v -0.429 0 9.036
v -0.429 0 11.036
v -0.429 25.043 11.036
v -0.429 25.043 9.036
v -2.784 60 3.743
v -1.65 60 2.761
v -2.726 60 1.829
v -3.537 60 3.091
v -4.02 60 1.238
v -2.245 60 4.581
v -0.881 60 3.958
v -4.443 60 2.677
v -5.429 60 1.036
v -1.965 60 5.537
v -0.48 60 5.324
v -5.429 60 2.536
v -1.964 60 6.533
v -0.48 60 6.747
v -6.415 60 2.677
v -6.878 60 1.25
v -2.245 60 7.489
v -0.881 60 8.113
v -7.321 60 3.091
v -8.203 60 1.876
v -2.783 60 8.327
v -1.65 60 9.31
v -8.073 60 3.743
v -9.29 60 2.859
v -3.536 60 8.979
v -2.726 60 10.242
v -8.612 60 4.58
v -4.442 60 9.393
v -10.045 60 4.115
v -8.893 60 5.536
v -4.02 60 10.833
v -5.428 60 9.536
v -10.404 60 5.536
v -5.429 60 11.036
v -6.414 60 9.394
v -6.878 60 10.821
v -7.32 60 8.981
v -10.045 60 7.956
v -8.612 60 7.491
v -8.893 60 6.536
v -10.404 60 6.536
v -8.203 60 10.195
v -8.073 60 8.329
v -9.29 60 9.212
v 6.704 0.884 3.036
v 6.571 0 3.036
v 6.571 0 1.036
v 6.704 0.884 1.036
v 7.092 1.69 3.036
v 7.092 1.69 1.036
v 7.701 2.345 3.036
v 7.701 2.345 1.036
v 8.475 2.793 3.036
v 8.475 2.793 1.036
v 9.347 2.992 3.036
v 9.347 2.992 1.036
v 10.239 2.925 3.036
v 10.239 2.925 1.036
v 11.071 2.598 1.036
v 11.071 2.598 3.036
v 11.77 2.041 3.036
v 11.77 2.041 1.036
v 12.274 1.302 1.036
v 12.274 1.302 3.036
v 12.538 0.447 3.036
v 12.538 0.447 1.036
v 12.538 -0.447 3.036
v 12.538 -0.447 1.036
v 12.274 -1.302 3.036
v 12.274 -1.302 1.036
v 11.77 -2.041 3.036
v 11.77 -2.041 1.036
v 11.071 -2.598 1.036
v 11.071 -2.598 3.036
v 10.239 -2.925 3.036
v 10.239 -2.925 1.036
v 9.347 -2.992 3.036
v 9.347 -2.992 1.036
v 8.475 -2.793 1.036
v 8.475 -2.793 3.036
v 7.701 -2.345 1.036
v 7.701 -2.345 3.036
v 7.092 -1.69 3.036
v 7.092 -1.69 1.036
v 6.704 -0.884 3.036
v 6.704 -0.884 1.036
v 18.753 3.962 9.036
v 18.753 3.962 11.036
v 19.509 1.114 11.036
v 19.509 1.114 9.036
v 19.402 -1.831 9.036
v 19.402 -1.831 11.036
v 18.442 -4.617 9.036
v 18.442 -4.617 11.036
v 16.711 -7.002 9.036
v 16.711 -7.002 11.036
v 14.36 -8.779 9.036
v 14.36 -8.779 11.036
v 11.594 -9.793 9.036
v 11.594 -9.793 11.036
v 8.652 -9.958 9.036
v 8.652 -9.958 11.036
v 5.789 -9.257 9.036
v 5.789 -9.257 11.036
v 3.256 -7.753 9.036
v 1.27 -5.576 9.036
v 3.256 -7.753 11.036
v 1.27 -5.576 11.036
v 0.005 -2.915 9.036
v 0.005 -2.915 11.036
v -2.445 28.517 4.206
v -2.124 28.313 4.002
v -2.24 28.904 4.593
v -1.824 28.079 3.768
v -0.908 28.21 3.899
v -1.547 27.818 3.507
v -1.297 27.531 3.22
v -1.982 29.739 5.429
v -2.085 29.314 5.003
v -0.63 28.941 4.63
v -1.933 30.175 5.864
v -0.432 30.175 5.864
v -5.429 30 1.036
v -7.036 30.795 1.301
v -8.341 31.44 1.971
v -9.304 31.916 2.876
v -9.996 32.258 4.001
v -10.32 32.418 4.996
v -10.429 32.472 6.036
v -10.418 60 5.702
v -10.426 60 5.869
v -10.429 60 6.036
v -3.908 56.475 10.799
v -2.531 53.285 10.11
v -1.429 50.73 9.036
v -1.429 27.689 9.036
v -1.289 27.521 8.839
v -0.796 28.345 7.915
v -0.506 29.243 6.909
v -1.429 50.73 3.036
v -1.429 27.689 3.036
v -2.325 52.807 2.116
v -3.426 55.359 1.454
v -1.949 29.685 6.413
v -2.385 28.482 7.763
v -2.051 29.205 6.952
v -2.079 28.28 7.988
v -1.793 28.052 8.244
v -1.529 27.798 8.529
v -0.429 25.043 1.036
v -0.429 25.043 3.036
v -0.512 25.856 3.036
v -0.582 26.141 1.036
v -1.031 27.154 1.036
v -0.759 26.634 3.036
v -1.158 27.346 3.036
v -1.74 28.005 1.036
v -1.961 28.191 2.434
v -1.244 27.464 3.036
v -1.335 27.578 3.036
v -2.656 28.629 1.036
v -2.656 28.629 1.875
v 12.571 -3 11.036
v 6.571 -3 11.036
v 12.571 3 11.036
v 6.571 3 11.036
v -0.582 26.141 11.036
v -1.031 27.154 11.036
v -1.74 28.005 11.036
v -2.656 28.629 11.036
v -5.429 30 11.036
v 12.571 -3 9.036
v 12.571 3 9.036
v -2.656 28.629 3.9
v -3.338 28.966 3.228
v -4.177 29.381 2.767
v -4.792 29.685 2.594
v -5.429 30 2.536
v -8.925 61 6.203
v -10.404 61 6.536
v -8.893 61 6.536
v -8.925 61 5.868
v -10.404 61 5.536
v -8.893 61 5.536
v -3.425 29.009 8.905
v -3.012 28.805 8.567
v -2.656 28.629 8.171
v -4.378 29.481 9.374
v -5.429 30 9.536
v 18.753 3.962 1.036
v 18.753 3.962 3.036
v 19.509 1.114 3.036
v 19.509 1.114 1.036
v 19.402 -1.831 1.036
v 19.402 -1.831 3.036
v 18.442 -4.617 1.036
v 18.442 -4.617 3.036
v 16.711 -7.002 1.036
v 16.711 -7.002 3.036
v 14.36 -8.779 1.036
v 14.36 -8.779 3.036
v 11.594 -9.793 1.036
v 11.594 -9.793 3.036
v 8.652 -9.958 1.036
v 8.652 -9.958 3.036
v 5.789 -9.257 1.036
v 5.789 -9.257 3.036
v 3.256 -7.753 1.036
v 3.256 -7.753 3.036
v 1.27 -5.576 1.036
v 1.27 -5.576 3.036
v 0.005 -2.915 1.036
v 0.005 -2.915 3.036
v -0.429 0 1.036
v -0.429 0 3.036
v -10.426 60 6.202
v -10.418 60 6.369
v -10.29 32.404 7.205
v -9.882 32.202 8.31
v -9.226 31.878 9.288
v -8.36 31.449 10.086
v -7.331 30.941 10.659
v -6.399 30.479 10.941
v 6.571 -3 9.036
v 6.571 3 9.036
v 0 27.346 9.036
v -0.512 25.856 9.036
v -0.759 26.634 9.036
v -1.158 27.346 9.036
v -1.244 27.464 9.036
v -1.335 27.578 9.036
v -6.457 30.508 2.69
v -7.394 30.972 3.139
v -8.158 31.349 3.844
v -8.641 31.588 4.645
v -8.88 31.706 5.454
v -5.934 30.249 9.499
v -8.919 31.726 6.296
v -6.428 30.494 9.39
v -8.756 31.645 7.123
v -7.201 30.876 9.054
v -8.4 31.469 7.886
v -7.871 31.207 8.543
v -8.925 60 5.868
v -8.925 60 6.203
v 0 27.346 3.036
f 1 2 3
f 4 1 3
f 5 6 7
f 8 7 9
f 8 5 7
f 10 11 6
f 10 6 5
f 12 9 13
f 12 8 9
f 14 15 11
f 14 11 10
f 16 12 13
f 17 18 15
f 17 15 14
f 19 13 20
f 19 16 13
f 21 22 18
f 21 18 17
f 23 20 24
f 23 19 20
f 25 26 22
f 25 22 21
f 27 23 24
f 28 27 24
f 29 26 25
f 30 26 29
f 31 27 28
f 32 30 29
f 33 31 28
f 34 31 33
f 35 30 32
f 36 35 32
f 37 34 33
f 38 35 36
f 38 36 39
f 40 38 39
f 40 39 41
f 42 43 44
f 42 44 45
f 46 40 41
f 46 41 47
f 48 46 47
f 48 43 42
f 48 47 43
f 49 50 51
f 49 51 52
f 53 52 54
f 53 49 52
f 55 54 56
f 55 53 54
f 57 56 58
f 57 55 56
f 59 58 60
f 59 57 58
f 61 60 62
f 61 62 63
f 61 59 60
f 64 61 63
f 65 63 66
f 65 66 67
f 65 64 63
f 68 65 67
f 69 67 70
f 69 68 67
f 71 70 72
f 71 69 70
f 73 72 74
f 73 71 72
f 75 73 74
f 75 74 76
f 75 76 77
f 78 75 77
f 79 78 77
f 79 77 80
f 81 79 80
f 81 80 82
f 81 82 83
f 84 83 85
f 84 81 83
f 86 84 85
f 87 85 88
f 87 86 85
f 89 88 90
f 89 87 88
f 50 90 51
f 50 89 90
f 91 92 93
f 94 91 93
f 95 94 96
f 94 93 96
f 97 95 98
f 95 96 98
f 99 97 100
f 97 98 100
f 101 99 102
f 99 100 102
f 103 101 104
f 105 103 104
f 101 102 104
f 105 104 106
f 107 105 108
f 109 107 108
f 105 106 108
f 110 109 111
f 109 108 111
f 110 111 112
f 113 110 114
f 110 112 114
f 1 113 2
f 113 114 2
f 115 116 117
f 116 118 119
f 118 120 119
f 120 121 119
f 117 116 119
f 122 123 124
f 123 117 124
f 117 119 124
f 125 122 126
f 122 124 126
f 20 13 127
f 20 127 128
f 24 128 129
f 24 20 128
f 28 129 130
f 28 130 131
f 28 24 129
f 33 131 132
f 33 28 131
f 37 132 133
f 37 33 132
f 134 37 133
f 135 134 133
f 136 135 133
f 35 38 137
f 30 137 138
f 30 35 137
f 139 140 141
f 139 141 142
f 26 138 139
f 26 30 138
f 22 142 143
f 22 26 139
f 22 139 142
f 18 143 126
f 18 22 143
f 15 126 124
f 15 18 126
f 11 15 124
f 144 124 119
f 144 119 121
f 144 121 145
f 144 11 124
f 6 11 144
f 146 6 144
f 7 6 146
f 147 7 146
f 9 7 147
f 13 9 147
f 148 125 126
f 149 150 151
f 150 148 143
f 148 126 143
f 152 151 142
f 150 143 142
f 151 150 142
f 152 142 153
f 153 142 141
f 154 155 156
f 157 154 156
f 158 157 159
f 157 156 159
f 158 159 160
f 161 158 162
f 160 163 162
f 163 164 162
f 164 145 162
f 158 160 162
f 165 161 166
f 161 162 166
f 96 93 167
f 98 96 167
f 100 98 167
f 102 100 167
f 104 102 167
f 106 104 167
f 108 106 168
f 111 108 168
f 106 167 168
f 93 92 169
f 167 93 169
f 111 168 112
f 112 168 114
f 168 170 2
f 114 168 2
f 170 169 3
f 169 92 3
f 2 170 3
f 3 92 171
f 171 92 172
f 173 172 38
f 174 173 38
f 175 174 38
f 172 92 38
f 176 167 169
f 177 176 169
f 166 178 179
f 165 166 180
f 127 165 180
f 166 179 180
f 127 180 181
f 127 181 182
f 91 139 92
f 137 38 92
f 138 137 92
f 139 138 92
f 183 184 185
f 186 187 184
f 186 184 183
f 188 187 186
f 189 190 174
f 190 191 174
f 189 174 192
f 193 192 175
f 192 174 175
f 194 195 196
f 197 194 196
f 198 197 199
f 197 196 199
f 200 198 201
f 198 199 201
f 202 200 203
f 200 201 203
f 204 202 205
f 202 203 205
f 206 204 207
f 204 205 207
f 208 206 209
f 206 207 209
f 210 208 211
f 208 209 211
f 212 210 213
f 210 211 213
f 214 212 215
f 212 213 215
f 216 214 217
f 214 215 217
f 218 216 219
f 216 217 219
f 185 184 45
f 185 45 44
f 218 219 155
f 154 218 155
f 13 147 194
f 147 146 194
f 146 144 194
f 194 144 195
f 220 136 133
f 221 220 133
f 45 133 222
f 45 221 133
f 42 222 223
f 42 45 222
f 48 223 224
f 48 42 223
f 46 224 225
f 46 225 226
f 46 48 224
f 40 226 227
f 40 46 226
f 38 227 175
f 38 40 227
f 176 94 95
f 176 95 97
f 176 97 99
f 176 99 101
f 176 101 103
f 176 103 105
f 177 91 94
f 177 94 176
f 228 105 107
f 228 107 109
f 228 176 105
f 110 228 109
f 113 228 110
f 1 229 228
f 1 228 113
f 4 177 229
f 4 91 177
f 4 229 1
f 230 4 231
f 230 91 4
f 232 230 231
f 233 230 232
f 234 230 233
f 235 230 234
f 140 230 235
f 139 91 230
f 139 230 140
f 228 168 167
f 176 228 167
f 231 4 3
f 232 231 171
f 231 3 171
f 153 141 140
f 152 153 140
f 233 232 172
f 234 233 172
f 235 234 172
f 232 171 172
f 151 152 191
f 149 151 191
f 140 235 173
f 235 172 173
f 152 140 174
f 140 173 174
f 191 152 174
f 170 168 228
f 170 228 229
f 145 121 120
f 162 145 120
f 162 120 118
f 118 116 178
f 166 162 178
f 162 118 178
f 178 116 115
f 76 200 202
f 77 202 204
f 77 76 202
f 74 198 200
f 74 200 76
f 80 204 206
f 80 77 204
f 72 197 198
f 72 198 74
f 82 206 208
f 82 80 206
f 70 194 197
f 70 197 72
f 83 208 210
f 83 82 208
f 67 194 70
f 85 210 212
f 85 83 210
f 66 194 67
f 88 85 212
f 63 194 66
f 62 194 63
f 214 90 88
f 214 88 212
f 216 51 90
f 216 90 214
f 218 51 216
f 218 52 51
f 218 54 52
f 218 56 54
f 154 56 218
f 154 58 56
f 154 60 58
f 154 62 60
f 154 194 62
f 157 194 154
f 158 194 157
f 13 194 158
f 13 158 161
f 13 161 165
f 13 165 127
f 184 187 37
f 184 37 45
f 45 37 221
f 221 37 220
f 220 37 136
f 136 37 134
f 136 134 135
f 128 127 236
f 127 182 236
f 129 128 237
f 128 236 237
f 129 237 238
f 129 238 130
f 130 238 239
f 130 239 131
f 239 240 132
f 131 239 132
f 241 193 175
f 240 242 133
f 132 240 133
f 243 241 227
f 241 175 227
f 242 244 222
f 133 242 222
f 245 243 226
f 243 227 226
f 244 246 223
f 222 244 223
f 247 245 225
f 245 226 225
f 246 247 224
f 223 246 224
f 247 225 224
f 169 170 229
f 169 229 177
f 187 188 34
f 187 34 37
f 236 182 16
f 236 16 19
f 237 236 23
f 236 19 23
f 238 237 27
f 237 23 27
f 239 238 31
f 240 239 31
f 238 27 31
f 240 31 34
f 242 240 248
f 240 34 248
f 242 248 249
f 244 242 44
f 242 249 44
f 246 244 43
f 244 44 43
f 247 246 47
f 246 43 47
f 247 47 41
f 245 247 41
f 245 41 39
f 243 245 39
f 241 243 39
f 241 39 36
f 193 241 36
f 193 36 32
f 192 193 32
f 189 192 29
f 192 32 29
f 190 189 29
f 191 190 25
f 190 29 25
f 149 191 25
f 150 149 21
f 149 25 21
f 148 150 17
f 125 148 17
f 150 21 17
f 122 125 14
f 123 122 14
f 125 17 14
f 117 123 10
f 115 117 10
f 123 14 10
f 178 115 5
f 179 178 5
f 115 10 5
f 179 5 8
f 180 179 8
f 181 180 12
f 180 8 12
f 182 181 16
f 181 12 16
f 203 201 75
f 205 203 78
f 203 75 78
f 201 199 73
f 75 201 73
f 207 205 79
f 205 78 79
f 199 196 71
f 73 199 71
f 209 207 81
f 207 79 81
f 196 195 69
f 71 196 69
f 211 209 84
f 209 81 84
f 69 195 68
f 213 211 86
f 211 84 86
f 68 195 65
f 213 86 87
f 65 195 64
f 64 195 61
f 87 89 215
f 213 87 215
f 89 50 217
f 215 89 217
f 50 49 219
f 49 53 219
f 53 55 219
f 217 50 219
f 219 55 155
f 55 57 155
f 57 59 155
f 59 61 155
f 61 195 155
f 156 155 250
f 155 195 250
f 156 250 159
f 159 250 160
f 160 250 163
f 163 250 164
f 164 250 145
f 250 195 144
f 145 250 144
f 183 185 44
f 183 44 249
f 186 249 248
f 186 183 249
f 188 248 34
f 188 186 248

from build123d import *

# Parameters (mm, degrees)
SKETCH1_R             = 3
BOSS_EXTRUDE1_DEPTH   = 2
SKETCH2_R             = 3
BOSS_EXTRUDE2_DEPTH   = 2
SKETCH3_R             = 5
CUT_EXTRUDE1_DEPTH    = 38
BOSS_EXTRUDE3_DEPTH   = 35
CUT_EXTRUDE2_DEPTH    = 13
SKETCH6_R             = 3.5
CUT_EXTRUDE3_DEPTH    = 42
SKETCH7_W             = 6
SKETCH7_H             = 6
CUT_EXTRUDE4_DEPTH    = 5
BODY_MOVE_COPY1_ANGLE = 90
BODY_MOVE_COPY2_ANGLE = 45
BODY_MOVE_COPY3_ANGLE = 45
CUT_EXTRUDE5_DEPTH    = 10
BOSS_EXTRUDE4_START   = 1
BOSS_EXTRUDE4_DEPTH   = 1


with BuildPart() as part:
    # Sketch1 → Boss-Extrude1 (new body)
    with BuildSketch(Plane.XY):
        with BuildLine():
            Line((10, 0), (10, 25))
            Line((10, 25), (10, 25.027864045))
            ThreePointArc((10, 25.027864045), (10.597396767, 27.130788493), (12.211145618, 28.605572809))
            Line((12.211145618, 28.605572809), (15, 30))
            Line((15, 30), (15, 60))
            Line((15, 60), (-9.181612248, 3.962069729))
            ThreePointArc((-9.181612248, 3.962069729), (-2.022854113, -9.793266117), (10, 0))
        make_face()
        Circle(SKETCH1_R, mode=Mode.SUBTRACT)
    extrude(amount=BOSS_EXTRUDE1_DEPTH)


with BuildPart() as body_2:
    # Sketch2 → Boss-Extrude2 (new body)
    with BuildSketch(Plane.XY.offset(8)):
        with BuildLine():
            Line((10, 0), (10, 25.027864045))
            Line((10, 25.027864045), (10, 25.043361255))
            ThreePointArc((10, 25.043361255), (10.602103374, 27.153882167), (12.22714926, 28.629027198))
            Line((12.22714926, 28.629027198), (15, 30))
            Line((15, 30), (15, 60))
            Line((15, 60), (-9.181612248, 3.962069729))
            ThreePointArc((-9.181612248, 3.962069729), (-2.022854113, -9.793266117), (10, 0))
        make_face()
        Circle(SKETCH2_R, mode=Mode.SUBTRACT)
    extrude(amount=BOSS_EXTRUDE2_DEPTH)


with BuildPart() as cut_extrude1_tool:
    # Sketch3 → Cut-Extrude1 (new body)
    with BuildSketch(Plane(origin=(0, 60, 0), x_dir=(1, 0, 0), z_dir=(0, 1, 0))):
        with Locations((15, -5)):
            Circle(SKETCH3_R)
    extrude(amount=-CUT_EXTRUDE1_DEPTH)


with BuildPart() as part_1:
    add(part.part)

    # Cut-Extrude1: cut by cut_extrude1_tool
    add(cut_extrude1_tool.part, mode=Mode.SUBTRACT)



with BuildPart() as body_2_1:
    add(body_2.part)

    # Cut-Extrude1: cut by cut_extrude1_tool
    add(cut_extrude1_tool.part, mode=Mode.SUBTRACT)


with BuildPart() as part_2:
    add(part_1.part)

    add(body_2_1.part)  # Boss-Extrude3 merges body 2
    # Sketch4 → Boss-Extrude3 (add)
    with BuildSketch(Plane(origin=(0, 60, 0), x_dir=(1, 0, 0), z_dir=(0, 1, 0))):
        with BuildLine():
            ThreePointArc((15, 0), (10, -5), (15, -10))
            Line((15, -10), (15, 0))
        make_face()
        with BuildLine():
            Line((15, 0), (15, -10))
            ThreePointArc((15, -10), (18.535533906, -8.535533906), (20, -5))
            ThreePointArc((20, -5), (18.535533906, -1.464466094), (15, 0))
        make_face()
    extrude(amount=-BOSS_EXTRUDE3_DEPTH)

    # Sketch5 → Cut-Extrude2 (cut)
    with BuildSketch(Plane.XY):
        with BuildLine():
            Line((10, 25.027864045), (10, 25.043361255))
            ThreePointArc((10, 25.043361255), (10.602103374, 27.153882167), (12.22714926, 28.629027198))
            Line((12.22714926, 28.629027198), (15, 30))
            Line((15, 30), (20, 32.472135955))
            Line((20, 32.472135955), (20, 25))
            Line((20, 25), (20, 22.63115285))
            Line((20, 22.63115285), (10, 22.63115285))
            Line((10, 22.63115285), (10, 25.027864045))
        make_face()
    extrude(amount=CUT_EXTRUDE2_DEPTH, mode=Mode.SUBTRACT)

    # Sketch6 → Cut-Extrude3 (cut)
    with BuildSketch(Plane(origin=(0, 60, 0), x_dir=(1, 0, 0), z_dir=(0, 1, 0))):
        with Locations(Location((15, -5, 0), (0, 0, 270))):
            Circle(SKETCH6_R)
    extrude(amount=-CUT_EXTRUDE3_DEPTH, mode=Mode.SUBTRACT)

    # Sketch7 → Cut-Extrude4 (cut)
    with BuildSketch(Plane(origin=(0, 0, 0), x_dir=(-1, 0, 0), z_dir=(0, 0, -1))):
        Rectangle(SKETCH7_W, SKETCH7_H)
    extrude(amount=-CUT_EXTRUDE4_DEPTH, mode=Mode.SUBTRACT)


with BuildPart() as part_3:
    # Body-Move/Copy1: moved
    add(part_2.part.rotate(Axis((5, 0, 5), (0, 1, 0)), BODY_MOVE_COPY1_ANGLE))


with BuildPart() as part_4:
    # Body-Move/Copy2: moved
    add(part_3.part.rotate(Axis((5, 0, 5), (0, 1, 0)), BODY_MOVE_COPY2_ANGLE))


with BuildPart() as part_5:
    # Body-Move/Copy3: moved
    add(part_4.part.rotate(Axis((6.035533906, 0, 6.035533906), (0, 1, 0)), BODY_MOVE_COPY3_ANGLE))

    # Sketch8 → Cut-Extrude5 (cut)
    with BuildSketch(Plane(origin=(0, 0, 0), x_dir=(0, 0, -1), z_dir=(1, 0, 0))):
        Polygon((-3.035533906, 27.346279357), (-5.863961031, 30.174706482), (-9.035533906, 27.346279357), (-6.035533906, 25.043361255), align=None)
    extrude(amount=-CUT_EXTRUDE5_DEPTH, mode=Mode.SUBTRACT)

    # Sketch11 → Boss-Extrude4 (add)
    with BuildSketch(Plane(origin=(0, 60, 0), x_dir=(1, 0, 0), z_dir=(0, 1, 0)).offset(BOSS_EXTRUDE4_START)):
        with BuildLine():
            Line((-10.403869374, -5.535533906), (-10.403869374, -6.535533906))
            Line((-10.403869374, -6.535533906), (-8.893033803, -6.535533906))
            ThreePointArc((-8.893033803, -6.535533906), (-8.928932188, -6.035533906), (-8.893033803, -5.535533906))
            Line((-8.893033803, -5.535533906), (-10.403869374, -5.535533906))
        make_face()
    extrude(amount=-BOSS_EXTRUDE4_DEPTH)


solid = part_5.part
